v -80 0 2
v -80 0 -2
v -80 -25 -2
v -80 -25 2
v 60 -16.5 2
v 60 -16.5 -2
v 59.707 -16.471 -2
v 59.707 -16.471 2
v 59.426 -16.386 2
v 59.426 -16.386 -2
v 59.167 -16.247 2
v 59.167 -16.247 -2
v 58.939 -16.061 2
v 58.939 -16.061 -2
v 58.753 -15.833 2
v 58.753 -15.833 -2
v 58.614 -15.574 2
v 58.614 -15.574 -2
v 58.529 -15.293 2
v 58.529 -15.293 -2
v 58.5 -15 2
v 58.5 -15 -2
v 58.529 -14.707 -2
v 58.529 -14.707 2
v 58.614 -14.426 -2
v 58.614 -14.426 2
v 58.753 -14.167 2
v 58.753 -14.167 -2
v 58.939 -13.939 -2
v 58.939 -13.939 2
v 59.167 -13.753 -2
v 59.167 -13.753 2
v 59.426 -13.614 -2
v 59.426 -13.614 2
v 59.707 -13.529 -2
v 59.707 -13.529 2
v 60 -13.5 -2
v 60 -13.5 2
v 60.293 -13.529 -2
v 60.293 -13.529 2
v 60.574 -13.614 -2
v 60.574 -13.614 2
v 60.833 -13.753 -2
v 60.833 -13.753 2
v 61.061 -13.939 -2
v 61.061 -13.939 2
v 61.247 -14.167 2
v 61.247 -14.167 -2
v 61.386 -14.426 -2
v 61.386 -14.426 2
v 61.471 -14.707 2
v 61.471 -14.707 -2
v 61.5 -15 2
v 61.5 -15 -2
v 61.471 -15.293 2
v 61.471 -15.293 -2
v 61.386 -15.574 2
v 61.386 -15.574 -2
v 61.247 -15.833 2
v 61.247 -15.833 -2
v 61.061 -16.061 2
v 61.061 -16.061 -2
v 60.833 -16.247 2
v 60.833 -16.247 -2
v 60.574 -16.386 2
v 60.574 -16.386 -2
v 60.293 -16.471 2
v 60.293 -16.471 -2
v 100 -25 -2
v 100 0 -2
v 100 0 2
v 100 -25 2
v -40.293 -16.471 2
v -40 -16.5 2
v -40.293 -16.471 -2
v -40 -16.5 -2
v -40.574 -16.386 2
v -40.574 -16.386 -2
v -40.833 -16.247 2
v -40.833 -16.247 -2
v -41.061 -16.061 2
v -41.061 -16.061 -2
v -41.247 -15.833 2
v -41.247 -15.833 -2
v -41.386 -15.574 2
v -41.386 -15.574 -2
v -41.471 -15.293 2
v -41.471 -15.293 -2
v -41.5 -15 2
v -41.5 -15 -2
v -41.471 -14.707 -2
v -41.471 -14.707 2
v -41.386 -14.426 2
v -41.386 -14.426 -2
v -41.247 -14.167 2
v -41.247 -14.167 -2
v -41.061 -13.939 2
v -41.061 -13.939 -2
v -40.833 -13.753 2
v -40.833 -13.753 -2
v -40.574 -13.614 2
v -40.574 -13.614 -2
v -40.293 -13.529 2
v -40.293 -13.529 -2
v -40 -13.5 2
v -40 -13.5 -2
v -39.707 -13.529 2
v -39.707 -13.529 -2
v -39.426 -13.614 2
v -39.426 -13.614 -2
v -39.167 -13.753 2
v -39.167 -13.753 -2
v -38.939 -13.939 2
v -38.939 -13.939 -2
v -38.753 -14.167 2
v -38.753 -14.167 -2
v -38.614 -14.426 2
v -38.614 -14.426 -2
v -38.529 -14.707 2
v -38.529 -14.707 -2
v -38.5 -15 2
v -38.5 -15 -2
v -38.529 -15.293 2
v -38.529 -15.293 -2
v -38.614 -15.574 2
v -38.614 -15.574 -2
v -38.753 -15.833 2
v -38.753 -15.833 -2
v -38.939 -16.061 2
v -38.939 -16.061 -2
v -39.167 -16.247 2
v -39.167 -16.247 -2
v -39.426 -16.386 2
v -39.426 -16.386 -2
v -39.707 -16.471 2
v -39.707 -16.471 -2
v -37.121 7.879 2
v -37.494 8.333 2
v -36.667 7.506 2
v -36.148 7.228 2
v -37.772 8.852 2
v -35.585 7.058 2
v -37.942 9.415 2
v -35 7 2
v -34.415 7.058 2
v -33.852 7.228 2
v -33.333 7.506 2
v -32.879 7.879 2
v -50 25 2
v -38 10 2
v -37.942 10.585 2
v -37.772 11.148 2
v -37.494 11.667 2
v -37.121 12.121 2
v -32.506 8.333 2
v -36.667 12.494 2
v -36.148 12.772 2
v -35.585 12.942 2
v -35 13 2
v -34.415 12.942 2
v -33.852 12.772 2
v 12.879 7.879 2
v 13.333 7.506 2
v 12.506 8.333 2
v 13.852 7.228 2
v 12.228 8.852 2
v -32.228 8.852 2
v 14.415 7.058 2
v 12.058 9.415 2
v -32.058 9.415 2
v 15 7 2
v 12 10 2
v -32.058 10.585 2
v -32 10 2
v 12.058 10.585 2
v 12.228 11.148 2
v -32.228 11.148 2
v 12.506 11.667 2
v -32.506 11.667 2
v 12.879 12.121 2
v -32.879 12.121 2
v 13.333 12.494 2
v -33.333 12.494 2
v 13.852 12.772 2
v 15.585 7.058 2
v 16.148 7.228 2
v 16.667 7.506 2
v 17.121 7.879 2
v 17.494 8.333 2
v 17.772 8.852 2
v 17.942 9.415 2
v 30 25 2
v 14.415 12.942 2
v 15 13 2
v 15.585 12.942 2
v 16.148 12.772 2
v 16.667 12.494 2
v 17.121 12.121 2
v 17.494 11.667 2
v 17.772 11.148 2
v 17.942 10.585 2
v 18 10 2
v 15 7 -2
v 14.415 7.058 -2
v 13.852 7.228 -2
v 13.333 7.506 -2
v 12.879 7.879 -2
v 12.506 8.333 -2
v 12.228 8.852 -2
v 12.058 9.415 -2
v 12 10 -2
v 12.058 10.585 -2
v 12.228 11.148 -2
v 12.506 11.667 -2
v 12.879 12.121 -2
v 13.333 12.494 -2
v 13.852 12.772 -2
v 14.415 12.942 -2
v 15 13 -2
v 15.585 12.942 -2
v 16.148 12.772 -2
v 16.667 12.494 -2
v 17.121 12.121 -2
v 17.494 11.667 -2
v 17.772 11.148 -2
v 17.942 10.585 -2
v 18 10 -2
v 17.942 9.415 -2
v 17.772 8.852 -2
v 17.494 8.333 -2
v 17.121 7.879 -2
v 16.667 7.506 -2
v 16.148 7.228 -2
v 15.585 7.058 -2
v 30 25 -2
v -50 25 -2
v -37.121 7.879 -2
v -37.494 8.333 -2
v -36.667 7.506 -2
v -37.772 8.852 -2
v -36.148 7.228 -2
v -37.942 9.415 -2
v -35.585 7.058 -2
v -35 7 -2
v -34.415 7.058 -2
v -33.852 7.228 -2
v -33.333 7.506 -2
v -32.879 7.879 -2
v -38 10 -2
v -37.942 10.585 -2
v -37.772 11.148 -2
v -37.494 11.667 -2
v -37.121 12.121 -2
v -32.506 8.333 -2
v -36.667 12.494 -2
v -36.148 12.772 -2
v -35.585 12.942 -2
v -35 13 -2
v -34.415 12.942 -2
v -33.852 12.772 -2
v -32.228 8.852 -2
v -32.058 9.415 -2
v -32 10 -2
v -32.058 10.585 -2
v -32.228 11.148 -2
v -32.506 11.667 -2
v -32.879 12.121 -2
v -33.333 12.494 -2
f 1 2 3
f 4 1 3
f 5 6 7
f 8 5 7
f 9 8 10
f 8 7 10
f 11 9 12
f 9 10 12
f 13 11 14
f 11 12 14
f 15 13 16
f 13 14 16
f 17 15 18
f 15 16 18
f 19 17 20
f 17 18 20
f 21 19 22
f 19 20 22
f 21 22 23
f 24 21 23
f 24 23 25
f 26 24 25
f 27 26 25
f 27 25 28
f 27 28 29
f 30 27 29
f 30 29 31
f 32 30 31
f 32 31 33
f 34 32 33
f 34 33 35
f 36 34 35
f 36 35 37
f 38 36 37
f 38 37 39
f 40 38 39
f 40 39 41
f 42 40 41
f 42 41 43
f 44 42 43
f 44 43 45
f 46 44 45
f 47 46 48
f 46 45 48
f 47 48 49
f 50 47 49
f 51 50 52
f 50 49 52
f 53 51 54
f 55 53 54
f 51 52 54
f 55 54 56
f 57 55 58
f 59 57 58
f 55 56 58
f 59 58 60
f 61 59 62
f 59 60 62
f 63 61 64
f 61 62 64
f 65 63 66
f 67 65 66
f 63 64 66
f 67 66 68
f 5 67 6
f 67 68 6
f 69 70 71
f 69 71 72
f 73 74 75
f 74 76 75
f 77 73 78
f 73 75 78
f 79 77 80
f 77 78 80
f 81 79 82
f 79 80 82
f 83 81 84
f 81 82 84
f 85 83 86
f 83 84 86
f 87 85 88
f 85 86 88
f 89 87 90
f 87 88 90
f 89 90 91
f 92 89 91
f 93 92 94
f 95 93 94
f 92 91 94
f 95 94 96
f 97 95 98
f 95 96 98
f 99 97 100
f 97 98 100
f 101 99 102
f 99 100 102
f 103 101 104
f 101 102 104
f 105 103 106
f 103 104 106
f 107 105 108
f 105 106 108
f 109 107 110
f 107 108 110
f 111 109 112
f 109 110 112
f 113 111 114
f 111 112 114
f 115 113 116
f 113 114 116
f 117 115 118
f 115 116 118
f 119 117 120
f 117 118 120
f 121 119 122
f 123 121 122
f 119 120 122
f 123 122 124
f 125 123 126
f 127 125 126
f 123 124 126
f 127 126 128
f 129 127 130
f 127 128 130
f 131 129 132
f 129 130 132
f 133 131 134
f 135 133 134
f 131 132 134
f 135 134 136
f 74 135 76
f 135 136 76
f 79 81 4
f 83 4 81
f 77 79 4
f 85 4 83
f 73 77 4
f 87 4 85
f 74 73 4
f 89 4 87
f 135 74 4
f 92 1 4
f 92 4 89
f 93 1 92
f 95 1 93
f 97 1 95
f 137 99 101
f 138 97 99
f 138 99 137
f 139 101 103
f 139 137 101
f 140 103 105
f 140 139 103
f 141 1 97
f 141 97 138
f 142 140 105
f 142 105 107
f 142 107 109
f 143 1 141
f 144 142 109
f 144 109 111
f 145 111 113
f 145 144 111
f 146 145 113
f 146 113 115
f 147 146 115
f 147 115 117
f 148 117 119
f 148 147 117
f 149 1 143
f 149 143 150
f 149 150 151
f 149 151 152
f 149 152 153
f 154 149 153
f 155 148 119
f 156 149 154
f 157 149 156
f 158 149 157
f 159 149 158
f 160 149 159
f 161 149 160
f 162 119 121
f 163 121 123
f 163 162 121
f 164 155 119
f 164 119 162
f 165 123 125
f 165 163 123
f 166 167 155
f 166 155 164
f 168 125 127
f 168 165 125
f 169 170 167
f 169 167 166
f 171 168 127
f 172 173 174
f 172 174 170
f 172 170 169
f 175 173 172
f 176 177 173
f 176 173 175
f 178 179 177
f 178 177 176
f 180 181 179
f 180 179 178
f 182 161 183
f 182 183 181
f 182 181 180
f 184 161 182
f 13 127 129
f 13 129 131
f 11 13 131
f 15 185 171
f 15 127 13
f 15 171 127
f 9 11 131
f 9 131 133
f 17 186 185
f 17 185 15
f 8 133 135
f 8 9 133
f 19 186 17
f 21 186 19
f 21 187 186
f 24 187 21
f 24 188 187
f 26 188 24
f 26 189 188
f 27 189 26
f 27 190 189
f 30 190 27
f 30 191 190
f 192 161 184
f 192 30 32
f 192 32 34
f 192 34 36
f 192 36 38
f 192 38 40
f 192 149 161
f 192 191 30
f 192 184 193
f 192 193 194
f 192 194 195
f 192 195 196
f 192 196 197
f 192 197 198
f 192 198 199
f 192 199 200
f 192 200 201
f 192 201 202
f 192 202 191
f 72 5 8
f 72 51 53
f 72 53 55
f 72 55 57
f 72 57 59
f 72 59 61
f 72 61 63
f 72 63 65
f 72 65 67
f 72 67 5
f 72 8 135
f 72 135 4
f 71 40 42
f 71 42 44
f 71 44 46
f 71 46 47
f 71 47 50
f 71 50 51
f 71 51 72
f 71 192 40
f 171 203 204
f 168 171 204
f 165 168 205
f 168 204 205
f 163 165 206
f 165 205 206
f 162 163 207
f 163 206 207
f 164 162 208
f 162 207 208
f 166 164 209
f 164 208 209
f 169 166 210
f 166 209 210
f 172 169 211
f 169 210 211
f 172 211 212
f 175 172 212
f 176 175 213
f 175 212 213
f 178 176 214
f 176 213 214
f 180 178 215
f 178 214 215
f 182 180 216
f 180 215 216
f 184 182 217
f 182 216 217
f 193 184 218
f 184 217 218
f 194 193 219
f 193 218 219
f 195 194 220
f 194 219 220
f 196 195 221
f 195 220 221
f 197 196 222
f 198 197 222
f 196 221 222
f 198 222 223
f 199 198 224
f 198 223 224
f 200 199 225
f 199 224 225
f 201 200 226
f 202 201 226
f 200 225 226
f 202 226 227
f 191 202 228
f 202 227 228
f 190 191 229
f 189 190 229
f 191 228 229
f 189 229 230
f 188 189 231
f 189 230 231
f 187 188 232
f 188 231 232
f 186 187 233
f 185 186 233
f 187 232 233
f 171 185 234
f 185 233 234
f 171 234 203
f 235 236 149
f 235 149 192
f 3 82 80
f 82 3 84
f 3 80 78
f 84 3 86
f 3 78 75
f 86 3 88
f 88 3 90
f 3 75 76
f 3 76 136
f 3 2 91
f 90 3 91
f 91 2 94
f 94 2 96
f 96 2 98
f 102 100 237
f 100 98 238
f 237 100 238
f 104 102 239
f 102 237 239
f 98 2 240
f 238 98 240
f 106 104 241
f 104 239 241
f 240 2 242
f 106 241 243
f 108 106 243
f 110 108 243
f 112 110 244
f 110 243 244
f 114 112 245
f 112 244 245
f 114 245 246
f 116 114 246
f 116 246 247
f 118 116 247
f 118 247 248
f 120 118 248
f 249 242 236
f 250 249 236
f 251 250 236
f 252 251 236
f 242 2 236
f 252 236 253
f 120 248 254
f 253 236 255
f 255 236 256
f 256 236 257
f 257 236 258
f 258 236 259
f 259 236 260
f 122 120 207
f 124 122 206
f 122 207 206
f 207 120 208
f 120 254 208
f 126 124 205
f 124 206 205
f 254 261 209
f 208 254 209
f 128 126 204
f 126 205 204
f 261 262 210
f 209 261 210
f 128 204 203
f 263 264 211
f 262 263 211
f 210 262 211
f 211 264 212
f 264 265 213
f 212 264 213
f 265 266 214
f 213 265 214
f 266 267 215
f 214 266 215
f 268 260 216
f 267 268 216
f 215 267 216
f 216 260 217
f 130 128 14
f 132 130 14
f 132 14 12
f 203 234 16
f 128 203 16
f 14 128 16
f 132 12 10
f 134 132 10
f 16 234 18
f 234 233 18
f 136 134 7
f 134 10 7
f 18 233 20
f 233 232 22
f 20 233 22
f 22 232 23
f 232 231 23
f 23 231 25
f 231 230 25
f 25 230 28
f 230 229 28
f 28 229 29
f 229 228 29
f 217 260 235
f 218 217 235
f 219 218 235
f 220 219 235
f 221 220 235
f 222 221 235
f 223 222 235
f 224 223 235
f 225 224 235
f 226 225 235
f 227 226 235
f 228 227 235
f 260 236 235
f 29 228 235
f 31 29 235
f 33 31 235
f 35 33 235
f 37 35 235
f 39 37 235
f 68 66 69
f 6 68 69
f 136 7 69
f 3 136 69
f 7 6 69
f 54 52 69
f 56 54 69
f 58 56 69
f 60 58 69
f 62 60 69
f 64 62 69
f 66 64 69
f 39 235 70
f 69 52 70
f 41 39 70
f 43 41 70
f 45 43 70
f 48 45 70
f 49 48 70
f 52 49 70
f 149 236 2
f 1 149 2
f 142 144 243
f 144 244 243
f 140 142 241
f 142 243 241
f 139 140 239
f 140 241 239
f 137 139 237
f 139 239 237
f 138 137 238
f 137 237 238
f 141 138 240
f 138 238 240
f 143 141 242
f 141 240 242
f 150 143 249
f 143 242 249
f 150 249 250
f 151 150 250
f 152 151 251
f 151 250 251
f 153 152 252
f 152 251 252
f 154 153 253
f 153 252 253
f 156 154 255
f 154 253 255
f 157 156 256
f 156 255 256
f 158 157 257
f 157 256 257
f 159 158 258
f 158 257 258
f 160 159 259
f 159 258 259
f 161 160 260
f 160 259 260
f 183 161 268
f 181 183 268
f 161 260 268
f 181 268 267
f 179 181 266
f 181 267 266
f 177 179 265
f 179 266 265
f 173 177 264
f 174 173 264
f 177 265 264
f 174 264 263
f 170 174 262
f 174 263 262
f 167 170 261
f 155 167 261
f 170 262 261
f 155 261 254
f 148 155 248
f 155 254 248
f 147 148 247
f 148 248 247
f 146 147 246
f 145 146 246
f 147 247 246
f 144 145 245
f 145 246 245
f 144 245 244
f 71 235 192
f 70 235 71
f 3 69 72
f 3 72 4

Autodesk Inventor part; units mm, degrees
ref_plane "YZ Plane" through (0, 0, 0) normal (1, 0, 0) x (0, 1, 0)
ref_plane "XZ Plane" through (0, 0, 0) normal (0, 1, 0) x (-1, 0, 0)
ref_plane "XY Plane" through (0, 0, 0) normal (0, 0, 1) x (1, 0, 0)
sketch "Náčrt1" plane through (0, 0, 0) normal (0, 0, 1) x (1, 0, 0)
  line L0 (-50, 25) -> (30, 25)
  line L1 (36.6643, -25) -> (-87.5, -25)
  line L2 (30, 25) -> (100, 0)
  line L3 (100, 0) -> (100, -25)
  line L4 (100, -25) -> (36.6643, -25)
  line L5 (-125, 0) -> (137.5, 0) projected
  line L6 (0, 35) -> (0, -35) projected
  line L7 (-50, 25) -> (-80, 0)
  line L8 (-80, 0) -> (-80, -25)
  line L9 (-80, -25) -> (-87.5, -25)
  point P0 (0, 0)
  point P1 (-35, 10)
  point P2 (15, 10)
  dimension "d0" = 50
  dimension "d2" = 80
  dimension "d3" = 25
  dimension "d4" = 50
  dimension "d6" = 15
  dimension "d16" = 70
  dimension "d17" = 30
  dimension "d18" = 25
  dimension "d19" = 50
  dimension "d20" = 35
  dimension "d21" = 25
  dimension "d22" = 25
extrude "Vysunutí1" add sketch "Náčrt1" along normal mid plane 4
hole "Díra1" at (-35, 10, 0) at (15, 10, 0) direction (0, 0, -1) diameter 6 end through all both
sketch "Náčrt2" plane through (0, 0, 2) normal (0, 0, 1) x (1, 0, 0)
  line L0 (-80, 0) -> (-80, -25) projected
  line L1 (-80, -25) -> (100, -25) projected
  line L2 (100, -25) -> (100, 0) projected
  point P0 (0, 0)
  point P1 (-40, -15)
  point P2 (60, -15)
  dimension "d23" = 40
  dimension "d24" = 10
  dimension "d25" = 40
  dimension "d26" = 10
hole "Díra2" at (-40, -15, 2) at (60, -15, 2) direction (0, 0, -1) diameter 3 depth 8
properties part number "Trup" material "Dřevo (Bříza)"
